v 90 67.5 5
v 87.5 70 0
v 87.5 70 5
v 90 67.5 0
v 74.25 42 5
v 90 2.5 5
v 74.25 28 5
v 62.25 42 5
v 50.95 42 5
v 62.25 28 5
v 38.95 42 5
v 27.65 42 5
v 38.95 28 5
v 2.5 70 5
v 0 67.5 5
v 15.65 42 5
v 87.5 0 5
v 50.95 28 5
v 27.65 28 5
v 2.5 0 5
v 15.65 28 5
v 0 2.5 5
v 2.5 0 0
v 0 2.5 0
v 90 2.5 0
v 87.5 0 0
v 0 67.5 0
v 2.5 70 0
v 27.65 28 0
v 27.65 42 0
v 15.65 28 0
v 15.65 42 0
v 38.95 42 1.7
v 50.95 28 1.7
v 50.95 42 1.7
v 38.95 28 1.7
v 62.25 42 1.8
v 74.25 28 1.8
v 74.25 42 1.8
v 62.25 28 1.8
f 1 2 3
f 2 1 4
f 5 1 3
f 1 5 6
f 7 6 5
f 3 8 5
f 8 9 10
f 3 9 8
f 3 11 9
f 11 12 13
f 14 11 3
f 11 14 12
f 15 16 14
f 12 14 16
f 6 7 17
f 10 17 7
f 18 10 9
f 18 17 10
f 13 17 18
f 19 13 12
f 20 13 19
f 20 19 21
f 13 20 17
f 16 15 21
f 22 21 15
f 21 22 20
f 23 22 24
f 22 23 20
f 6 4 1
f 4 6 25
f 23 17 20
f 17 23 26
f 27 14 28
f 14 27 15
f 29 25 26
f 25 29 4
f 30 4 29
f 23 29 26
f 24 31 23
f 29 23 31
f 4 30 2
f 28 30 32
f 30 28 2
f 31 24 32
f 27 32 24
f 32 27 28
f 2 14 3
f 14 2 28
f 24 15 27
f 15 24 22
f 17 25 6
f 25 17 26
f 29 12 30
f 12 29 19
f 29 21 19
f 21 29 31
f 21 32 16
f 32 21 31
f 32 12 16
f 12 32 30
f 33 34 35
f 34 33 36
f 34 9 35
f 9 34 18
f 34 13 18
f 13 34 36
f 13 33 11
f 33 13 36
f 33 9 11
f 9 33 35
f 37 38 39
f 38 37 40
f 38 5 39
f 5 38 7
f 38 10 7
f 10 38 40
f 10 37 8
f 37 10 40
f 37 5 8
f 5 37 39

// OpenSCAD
$fn = 32;
// target_bbox: 90, 70, 5
// ----------------------------------------------------------------------
// Windowed plate: 3 voids, 90 x 70 x 5 mm
// ----------------------------------------------------------------------

// --- parameters (mm) ---
plate_l = 90;             // plate length, X
plate_w = 70;             // plate width, Y
plate_t = 5;              // plate thickness, Z
edge_margin = 10;         // wall from the plate edge to any window
windows = 3;              // number of windows in the row
win_l = 12;               // window length
win_w = 14;               // window width
win_pitch = 23.3;         // window pitch along X
depth_1 = 5;              // depth of void 1 (full thickness = through)
depth_2 = 3.3;            // depth of void 2 (full thickness = through)
depth_3 = 3.2;            // depth of void 3 (full thickness = through)
corner_c = 2.5;           // corner chamfer of the plate

profile = [[2.5, 0], [87.5, 0], [90, 2.5], [90, 67.5], [87.5, 70], [2.5, 70], [0, 67.5], [0, 2.5]];  // primary outline, 8 points, counter clockwise
void_1 = [[15.65, 28], [27.65, 28], [27.65, 42], [15.65, 42]];  // window 1 of the row, 4 points
void_2 = [[38.95, 28], [50.95, 28], [50.95, 42], [38.95, 42]];  // window 2 of the row, 4 points
void_3 = [[62.25, 28], [74.25, 28], [74.25, 42], [62.25, 42]];  // window 3 of the row, 4 points

// --- the one profile operation ---
difference() {
  linear_extrude(height = plate_t) polygon(points = profile);
  translate([0, 0, -1])
    linear_extrude(height = plate_t + 2) polygon(points = void_1);
  translate([0, 0, plate_t - depth_2])
    linear_extrude(height = depth_2 + 1) polygon(points = void_2);
  translate([0, 0, plate_t - depth_3])
    linear_extrude(height = depth_3 + 1) polygon(points = void_3);
}
